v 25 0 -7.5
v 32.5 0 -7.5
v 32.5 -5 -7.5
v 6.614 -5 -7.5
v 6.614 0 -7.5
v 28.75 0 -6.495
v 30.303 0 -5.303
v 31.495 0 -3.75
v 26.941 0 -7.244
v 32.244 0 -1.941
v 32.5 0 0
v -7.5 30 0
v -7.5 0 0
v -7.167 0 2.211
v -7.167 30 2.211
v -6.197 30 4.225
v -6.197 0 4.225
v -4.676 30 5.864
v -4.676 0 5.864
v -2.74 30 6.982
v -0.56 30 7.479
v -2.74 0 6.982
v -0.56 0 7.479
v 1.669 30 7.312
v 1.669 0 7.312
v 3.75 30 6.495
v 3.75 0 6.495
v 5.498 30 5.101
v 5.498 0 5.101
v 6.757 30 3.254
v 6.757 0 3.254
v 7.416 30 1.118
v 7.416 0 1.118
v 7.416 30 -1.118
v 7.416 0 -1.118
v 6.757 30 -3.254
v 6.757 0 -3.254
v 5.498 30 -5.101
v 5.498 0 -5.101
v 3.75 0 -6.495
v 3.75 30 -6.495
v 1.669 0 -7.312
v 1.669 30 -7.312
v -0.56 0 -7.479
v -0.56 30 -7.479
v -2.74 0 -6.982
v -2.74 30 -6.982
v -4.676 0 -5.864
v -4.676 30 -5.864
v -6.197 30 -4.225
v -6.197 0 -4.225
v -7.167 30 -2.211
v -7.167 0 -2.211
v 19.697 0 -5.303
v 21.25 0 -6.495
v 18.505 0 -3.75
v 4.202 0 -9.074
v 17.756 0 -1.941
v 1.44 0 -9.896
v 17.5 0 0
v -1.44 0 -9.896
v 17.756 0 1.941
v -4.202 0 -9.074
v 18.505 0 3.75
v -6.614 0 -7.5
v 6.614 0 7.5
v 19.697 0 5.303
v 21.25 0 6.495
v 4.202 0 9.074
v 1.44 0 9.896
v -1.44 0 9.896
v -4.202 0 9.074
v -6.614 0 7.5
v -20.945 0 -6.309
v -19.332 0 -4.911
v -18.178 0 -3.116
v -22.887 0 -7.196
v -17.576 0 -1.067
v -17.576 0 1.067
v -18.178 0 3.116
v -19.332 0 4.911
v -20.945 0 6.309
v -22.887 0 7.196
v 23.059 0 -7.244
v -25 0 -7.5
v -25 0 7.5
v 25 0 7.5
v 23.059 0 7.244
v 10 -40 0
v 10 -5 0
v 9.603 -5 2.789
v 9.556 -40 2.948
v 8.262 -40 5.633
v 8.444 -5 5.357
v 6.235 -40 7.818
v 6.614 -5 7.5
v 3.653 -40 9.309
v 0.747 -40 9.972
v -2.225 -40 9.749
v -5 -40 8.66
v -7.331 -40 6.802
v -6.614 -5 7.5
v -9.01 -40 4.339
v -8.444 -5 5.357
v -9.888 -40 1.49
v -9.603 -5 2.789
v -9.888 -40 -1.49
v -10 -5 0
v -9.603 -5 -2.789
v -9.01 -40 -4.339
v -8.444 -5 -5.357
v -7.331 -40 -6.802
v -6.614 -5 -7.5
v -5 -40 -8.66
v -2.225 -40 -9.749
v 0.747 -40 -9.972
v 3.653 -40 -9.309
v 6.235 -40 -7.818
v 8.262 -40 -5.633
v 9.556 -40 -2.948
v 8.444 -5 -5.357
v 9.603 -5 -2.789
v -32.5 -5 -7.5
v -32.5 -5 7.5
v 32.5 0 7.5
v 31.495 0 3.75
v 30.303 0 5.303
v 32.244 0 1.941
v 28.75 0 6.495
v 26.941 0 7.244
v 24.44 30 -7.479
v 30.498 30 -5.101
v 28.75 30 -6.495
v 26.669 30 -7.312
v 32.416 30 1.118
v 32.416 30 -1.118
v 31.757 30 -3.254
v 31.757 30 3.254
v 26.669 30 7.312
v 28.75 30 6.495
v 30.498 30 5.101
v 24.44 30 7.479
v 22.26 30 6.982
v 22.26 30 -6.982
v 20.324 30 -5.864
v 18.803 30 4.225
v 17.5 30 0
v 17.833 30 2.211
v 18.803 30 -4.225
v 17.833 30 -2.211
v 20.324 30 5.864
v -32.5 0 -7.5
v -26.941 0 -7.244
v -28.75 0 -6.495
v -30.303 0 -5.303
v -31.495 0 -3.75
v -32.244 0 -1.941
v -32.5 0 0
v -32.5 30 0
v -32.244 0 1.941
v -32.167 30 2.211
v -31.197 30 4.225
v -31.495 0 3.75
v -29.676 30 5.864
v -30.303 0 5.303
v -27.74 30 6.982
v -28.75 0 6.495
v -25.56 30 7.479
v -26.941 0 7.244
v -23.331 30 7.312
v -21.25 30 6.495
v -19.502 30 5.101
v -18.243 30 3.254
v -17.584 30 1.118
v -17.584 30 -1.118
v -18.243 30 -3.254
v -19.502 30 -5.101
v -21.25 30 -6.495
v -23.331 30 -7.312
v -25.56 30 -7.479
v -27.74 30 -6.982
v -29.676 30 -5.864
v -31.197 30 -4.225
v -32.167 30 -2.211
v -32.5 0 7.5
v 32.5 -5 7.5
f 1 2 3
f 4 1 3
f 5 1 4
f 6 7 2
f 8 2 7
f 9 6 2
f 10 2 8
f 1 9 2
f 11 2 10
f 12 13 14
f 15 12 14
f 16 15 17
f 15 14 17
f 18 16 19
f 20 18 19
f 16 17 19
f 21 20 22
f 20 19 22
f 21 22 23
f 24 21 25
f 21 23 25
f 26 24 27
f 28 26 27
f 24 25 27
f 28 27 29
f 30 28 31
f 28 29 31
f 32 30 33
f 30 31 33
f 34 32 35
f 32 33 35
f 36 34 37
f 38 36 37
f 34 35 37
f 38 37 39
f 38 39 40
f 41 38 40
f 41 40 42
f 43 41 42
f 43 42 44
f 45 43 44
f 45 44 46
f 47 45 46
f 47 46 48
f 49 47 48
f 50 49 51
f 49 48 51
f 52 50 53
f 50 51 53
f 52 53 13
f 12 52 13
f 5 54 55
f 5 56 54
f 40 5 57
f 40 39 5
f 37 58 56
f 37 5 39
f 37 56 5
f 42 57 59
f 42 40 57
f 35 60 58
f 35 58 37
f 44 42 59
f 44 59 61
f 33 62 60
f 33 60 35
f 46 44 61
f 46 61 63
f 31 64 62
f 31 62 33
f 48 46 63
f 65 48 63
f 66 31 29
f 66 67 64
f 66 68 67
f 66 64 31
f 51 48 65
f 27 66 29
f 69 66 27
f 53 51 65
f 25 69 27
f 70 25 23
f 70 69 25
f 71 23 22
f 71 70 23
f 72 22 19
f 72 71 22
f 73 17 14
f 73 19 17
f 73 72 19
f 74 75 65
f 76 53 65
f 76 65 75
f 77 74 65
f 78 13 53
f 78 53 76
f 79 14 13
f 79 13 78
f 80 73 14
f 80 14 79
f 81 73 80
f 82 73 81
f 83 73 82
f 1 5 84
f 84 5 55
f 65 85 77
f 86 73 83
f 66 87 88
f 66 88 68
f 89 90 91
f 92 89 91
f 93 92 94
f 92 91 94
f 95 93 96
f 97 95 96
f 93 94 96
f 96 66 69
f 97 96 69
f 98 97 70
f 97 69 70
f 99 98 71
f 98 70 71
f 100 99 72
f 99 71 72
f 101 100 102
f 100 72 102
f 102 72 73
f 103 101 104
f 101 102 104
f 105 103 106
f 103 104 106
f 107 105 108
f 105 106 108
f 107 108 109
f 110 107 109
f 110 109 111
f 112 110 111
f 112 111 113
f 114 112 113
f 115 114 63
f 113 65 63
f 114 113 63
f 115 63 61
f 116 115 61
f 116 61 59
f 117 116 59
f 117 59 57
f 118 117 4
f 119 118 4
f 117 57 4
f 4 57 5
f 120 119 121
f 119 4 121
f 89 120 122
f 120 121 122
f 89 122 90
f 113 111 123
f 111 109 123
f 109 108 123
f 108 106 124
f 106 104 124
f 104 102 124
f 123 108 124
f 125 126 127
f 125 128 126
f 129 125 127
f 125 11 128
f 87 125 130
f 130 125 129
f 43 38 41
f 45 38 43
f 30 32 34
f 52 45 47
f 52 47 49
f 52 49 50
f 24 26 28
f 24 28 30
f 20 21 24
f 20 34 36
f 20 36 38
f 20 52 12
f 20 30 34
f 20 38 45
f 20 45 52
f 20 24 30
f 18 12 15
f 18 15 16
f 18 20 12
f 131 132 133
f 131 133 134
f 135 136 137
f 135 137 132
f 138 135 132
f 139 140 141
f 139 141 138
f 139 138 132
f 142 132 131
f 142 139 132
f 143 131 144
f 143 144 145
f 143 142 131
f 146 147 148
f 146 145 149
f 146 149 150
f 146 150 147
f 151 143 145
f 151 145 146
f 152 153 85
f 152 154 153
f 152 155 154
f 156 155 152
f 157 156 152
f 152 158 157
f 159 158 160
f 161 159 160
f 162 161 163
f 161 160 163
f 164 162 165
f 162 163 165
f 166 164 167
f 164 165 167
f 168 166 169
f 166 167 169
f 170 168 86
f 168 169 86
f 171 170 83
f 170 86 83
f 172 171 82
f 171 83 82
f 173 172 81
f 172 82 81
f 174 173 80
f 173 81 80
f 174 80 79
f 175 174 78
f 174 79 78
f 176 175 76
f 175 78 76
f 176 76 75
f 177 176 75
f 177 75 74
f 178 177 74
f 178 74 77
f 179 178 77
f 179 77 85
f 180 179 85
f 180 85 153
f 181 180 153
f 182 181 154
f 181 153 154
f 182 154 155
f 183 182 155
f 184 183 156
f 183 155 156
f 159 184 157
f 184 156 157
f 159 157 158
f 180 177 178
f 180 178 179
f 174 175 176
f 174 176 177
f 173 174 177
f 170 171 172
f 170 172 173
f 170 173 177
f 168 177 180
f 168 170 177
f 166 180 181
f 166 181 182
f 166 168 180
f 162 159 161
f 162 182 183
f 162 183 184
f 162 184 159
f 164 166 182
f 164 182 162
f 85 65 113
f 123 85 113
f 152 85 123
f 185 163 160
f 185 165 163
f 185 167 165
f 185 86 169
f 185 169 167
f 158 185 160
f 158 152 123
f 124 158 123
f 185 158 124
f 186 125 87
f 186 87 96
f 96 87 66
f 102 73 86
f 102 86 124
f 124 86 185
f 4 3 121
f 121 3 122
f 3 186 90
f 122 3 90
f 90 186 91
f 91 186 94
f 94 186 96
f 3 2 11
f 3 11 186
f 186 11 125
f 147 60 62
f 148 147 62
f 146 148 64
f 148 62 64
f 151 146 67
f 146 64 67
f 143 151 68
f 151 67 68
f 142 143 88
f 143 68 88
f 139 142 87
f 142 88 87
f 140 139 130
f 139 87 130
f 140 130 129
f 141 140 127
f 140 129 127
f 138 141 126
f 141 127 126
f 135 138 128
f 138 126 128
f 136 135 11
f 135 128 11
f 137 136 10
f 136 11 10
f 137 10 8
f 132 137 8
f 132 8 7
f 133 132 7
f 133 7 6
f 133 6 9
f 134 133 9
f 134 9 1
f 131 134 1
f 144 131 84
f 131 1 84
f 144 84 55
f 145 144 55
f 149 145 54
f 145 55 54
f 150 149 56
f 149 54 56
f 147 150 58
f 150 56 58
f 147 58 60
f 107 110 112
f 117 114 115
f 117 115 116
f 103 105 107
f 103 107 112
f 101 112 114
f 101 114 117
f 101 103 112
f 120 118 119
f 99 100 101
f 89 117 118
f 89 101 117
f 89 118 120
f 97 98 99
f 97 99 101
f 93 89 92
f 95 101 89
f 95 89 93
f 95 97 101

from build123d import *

# Parameters (mm, degrees)
F0_R     = 10
F1_DEPTH = 40
F2_W     = 65
F2_H     = 15
F3_DEPTH = 5
F4_R     = 7.5
F5_DEPTH = 30


with BuildPart() as f1:
    # F0 (on Front) → F1 (new body)
    with BuildSketch(Plane.XZ):
        Circle(F0_R)
    extrude(amount=F1_DEPTH)

    # F2 (on face) → F3 (join)
    with BuildSketch(Plane(origin=(0, 0, 0), x_dir=(-1, 0, 0), z_dir=(0, 1, 0))):
        Rectangle(F2_W, F2_H)
    extrude(amount=-F3_DEPTH)

    # F4 (on face) → F5 (join)
    with BuildSketch(Plane(origin=(0, 0, 0), x_dir=(-1, 0, 0), z_dir=(0, 1, 0))):
        Circle(F4_R)
        with Locations((-25, 0)):
            Circle(F4_R)
        with Locations((25, 0)):
            Circle(F4_R)
    extrude(amount=F5_DEPTH)


solid = f1.part
